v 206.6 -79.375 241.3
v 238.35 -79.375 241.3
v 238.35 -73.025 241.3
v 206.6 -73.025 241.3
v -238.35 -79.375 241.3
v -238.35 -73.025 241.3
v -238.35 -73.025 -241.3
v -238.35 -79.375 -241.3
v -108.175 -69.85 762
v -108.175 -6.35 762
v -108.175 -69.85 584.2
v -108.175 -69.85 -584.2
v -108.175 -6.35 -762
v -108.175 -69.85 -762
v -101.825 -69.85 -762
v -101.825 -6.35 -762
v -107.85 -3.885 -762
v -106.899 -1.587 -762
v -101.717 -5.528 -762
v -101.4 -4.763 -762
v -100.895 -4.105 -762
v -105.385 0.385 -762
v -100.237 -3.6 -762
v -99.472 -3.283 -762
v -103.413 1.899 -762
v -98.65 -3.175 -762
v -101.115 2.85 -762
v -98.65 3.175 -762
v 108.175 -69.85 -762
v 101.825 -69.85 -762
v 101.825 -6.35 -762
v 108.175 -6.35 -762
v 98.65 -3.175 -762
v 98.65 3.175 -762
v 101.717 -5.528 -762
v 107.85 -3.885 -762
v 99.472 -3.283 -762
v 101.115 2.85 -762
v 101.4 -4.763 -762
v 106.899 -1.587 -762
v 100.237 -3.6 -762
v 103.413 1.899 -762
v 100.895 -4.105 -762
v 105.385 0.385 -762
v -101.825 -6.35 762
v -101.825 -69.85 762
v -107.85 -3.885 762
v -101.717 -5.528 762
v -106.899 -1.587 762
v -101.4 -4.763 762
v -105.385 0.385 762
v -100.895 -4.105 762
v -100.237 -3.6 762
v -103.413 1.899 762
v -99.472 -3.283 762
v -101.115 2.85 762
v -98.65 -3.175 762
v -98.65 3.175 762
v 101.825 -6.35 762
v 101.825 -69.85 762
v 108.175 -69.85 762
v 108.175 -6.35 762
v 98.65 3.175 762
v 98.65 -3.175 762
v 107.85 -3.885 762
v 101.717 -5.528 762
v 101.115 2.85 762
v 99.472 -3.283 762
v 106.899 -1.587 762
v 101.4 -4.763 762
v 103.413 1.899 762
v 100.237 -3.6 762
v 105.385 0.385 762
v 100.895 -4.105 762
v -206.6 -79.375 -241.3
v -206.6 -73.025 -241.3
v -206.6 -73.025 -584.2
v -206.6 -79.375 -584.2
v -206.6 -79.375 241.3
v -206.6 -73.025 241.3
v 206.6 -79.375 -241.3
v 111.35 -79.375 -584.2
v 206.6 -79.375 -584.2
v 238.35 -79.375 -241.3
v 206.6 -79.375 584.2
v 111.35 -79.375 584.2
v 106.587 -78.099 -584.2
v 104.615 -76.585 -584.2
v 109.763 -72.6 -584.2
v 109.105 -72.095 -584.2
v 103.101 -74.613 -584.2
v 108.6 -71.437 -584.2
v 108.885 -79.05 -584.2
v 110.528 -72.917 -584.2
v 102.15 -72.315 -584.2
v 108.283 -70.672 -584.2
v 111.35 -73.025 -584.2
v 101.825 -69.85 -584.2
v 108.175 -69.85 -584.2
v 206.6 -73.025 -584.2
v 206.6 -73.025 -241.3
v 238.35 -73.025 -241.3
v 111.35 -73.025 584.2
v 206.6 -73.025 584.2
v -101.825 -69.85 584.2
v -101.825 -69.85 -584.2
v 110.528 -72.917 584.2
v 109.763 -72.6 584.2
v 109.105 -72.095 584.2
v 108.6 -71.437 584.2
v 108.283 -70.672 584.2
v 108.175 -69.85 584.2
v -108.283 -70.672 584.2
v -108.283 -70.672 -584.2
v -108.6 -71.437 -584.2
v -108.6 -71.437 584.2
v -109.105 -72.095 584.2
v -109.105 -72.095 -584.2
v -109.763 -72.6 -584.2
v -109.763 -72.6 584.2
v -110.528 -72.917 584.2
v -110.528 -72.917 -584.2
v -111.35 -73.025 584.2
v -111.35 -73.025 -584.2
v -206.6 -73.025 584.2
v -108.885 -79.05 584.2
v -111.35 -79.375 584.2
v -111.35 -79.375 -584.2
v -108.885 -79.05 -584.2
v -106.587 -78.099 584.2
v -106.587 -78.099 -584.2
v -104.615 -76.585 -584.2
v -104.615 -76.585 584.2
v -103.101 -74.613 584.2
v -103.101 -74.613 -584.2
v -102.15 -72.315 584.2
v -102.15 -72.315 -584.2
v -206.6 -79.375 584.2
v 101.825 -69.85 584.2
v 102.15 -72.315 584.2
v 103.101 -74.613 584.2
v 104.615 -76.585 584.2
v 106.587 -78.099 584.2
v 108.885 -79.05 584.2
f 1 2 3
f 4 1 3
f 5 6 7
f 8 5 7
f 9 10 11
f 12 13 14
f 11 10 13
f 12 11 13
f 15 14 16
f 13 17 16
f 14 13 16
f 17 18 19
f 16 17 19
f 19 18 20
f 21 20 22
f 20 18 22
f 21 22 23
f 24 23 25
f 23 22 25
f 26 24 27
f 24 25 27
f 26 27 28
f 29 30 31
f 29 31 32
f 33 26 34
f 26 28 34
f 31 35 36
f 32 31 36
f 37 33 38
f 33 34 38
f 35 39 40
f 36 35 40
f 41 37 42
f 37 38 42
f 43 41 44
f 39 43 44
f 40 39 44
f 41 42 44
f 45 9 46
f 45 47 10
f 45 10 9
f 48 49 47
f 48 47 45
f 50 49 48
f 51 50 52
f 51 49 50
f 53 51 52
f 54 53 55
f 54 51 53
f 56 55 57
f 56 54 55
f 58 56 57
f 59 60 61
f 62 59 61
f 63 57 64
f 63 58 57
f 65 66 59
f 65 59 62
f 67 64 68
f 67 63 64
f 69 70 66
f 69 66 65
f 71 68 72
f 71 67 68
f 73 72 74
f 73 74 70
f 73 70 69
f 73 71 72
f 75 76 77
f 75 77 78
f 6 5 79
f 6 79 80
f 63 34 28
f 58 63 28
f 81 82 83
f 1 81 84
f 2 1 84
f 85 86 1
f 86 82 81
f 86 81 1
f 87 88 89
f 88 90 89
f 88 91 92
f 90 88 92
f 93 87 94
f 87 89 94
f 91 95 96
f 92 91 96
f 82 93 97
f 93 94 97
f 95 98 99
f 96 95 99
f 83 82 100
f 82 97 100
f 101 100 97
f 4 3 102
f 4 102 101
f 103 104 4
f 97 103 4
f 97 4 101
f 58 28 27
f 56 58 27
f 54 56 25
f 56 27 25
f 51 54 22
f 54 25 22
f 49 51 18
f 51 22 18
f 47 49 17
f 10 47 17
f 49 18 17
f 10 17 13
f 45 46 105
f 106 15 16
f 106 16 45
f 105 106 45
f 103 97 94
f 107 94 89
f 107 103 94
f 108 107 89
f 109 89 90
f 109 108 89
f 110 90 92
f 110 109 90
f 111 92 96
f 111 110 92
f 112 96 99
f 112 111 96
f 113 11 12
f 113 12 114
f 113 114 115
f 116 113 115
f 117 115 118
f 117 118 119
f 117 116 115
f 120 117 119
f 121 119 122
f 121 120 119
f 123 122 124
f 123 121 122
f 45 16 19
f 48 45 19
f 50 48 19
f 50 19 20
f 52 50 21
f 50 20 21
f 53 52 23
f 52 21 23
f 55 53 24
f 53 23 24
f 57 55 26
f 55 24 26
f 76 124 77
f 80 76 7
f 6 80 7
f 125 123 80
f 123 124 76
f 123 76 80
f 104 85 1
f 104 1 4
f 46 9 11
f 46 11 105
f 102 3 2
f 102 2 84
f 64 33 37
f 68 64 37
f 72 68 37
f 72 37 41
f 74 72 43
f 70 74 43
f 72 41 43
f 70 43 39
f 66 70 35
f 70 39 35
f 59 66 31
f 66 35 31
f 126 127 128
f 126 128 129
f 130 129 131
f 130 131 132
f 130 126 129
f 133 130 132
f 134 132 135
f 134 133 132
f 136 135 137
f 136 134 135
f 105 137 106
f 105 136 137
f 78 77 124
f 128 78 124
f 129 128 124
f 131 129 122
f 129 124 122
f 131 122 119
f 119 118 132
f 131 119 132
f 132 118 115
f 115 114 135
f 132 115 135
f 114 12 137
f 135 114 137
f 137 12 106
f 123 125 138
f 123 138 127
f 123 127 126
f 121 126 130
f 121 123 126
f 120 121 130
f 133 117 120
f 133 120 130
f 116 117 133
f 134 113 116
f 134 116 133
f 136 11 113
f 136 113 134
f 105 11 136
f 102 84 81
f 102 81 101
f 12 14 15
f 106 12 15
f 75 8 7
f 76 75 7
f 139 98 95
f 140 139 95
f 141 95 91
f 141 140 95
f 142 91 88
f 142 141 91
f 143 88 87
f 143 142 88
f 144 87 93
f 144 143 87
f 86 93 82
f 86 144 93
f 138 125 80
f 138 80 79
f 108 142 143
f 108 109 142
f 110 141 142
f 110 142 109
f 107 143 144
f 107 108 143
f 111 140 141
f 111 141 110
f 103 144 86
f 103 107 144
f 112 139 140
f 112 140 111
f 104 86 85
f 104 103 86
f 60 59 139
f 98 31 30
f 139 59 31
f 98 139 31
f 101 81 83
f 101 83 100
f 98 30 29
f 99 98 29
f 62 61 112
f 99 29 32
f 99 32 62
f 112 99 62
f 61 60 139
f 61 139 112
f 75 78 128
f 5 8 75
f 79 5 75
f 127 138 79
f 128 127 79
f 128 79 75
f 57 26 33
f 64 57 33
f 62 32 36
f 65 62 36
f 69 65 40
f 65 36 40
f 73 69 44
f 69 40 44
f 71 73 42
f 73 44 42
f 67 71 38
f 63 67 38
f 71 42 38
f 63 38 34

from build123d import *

# Parameters (mm, degrees)
EXTRUDE_THIN1_DEPTH = 584.2
BOSS_EXTRUDE1_START = 177.8
BOSS_EXTRUDE1_DEPTH = 177.8
SKETCH4_W           = 482.6
SKETCH4_H           = 6.35
BOSS_EXTRUDE2_DEPTH = 31.75


with BuildPart() as part:
    # Sketch1 → Extrude-Thin1 (new, symmetric)
    with BuildSketch(Plane.XY):
        with BuildLine():
            Line((-206.6, -79.375), (-111.35, -79.375))
            ThreePointArc((-111.35, -79.375), (-104.614807909, -76.585192091), (-101.825, -69.85))
            Line((-101.825, -69.85), (-101.825, -6.35))
            ThreePointArc((-101.825, -6.35), (-100.89506403, -4.10493597), (-98.65, -3.175))
            Line((-98.65, -3.175), (98.65, -3.175))
            ThreePointArc((98.65, -3.175), (100.89506403, -4.10493597), (101.825, -6.35))
            Line((101.825, -6.35), (101.825, -69.85))
            ThreePointArc((101.825, -69.85), (104.614807909, -76.585192091), (111.35, -79.375))
            Line((111.35, -79.375), (206.6, -79.375))
            Line((206.6, -79.375), (206.6, -73.025))
            Line((206.6, -73.025), (111.35, -73.025))
            ThreePointArc((111.35, -73.025), (109.10493597, -72.09506403), (108.175, -69.85))
            Line((108.175, -69.85), (108.175, -6.35))
            ThreePointArc((108.175, -6.35), (105.385192091, 0.385192091), (98.65, 3.175))
            Line((98.65, 3.175), (-98.65, 3.175))
            ThreePointArc((-98.65, 3.175), (-105.385192091, 0.385192091), (-108.175, -6.35))
            Line((-108.175, -6.35), (-108.175, -69.85))
            ThreePointArc((-108.175, -69.85), (-109.10493597, -72.09506403), (-111.35, -73.025))
            Line((-111.35, -73.025), (-206.6, -73.025))
            Line((-206.6, -73.025), (-206.6, -79.375))
        make_face()
    extrude(amount=EXTRUDE_THIN1_DEPTH, both=True)

    # Sketch3 → Boss-Extrude1 (add)
    with BuildSketch(Plane.XY.offset(584.2).offset(BOSS_EXTRUDE1_START)):
        with BuildLine():
            Line((-108.175, -69.85), (-101.825, -69.85))
            Line((-101.825, -69.85), (-101.825, -6.35))
            ThreePointArc((-101.825, -6.35), (-100.89506403, -4.10493597), (-98.65, -3.175))
            Line((-98.65, -3.175), (98.65, -3.175))
            ThreePointArc((98.65, -3.175), (100.89506403, -4.10493597), (101.825, -6.35))
            Line((101.825, -6.35), (101.825, -69.85))
            Line((101.825, -69.85), (108.175, -69.85))
            Line((108.175, -69.85), (108.175, -6.35))
            ThreePointArc((108.175, -6.35), (105.385192091, 0.385192091), (98.65, 3.175))
            Line((98.65, 3.175), (-98.65, 3.175))
            ThreePointArc((-98.65, 3.175), (-105.385192091, 0.385192091), (-108.175, -6.35))
            Line((-108.175, -6.35), (-108.175, -69.85))
        make_face()
    boss_extrude1 = extrude(amount=-BOSS_EXTRUDE1_DEPTH)

    # Sketch4 → Boss-Extrude2 (add)
    with BuildSketch(Plane(origin=(206.6, 0, 0), x_dir=(0, 0, -1), z_dir=(1, 0, 0))):
        with Locations((0, -76.2)):
            Rectangle(SKETCH4_W, SKETCH4_H)
    boss_extrude2 = extrude(amount=BOSS_EXTRUDE2_DEPTH)

    # Mirror1: Boss-Extrude1 across plane
    add(boss_extrude1.mirror(Plane.XY))

    # Mirror2: Boss-Extrude2 across plane
    add(boss_extrude2.mirror(Plane(origin=(0, 0, 0), x_dir=(0, 0, 1), z_dir=(1, 0, 0))))


solid = part.part
